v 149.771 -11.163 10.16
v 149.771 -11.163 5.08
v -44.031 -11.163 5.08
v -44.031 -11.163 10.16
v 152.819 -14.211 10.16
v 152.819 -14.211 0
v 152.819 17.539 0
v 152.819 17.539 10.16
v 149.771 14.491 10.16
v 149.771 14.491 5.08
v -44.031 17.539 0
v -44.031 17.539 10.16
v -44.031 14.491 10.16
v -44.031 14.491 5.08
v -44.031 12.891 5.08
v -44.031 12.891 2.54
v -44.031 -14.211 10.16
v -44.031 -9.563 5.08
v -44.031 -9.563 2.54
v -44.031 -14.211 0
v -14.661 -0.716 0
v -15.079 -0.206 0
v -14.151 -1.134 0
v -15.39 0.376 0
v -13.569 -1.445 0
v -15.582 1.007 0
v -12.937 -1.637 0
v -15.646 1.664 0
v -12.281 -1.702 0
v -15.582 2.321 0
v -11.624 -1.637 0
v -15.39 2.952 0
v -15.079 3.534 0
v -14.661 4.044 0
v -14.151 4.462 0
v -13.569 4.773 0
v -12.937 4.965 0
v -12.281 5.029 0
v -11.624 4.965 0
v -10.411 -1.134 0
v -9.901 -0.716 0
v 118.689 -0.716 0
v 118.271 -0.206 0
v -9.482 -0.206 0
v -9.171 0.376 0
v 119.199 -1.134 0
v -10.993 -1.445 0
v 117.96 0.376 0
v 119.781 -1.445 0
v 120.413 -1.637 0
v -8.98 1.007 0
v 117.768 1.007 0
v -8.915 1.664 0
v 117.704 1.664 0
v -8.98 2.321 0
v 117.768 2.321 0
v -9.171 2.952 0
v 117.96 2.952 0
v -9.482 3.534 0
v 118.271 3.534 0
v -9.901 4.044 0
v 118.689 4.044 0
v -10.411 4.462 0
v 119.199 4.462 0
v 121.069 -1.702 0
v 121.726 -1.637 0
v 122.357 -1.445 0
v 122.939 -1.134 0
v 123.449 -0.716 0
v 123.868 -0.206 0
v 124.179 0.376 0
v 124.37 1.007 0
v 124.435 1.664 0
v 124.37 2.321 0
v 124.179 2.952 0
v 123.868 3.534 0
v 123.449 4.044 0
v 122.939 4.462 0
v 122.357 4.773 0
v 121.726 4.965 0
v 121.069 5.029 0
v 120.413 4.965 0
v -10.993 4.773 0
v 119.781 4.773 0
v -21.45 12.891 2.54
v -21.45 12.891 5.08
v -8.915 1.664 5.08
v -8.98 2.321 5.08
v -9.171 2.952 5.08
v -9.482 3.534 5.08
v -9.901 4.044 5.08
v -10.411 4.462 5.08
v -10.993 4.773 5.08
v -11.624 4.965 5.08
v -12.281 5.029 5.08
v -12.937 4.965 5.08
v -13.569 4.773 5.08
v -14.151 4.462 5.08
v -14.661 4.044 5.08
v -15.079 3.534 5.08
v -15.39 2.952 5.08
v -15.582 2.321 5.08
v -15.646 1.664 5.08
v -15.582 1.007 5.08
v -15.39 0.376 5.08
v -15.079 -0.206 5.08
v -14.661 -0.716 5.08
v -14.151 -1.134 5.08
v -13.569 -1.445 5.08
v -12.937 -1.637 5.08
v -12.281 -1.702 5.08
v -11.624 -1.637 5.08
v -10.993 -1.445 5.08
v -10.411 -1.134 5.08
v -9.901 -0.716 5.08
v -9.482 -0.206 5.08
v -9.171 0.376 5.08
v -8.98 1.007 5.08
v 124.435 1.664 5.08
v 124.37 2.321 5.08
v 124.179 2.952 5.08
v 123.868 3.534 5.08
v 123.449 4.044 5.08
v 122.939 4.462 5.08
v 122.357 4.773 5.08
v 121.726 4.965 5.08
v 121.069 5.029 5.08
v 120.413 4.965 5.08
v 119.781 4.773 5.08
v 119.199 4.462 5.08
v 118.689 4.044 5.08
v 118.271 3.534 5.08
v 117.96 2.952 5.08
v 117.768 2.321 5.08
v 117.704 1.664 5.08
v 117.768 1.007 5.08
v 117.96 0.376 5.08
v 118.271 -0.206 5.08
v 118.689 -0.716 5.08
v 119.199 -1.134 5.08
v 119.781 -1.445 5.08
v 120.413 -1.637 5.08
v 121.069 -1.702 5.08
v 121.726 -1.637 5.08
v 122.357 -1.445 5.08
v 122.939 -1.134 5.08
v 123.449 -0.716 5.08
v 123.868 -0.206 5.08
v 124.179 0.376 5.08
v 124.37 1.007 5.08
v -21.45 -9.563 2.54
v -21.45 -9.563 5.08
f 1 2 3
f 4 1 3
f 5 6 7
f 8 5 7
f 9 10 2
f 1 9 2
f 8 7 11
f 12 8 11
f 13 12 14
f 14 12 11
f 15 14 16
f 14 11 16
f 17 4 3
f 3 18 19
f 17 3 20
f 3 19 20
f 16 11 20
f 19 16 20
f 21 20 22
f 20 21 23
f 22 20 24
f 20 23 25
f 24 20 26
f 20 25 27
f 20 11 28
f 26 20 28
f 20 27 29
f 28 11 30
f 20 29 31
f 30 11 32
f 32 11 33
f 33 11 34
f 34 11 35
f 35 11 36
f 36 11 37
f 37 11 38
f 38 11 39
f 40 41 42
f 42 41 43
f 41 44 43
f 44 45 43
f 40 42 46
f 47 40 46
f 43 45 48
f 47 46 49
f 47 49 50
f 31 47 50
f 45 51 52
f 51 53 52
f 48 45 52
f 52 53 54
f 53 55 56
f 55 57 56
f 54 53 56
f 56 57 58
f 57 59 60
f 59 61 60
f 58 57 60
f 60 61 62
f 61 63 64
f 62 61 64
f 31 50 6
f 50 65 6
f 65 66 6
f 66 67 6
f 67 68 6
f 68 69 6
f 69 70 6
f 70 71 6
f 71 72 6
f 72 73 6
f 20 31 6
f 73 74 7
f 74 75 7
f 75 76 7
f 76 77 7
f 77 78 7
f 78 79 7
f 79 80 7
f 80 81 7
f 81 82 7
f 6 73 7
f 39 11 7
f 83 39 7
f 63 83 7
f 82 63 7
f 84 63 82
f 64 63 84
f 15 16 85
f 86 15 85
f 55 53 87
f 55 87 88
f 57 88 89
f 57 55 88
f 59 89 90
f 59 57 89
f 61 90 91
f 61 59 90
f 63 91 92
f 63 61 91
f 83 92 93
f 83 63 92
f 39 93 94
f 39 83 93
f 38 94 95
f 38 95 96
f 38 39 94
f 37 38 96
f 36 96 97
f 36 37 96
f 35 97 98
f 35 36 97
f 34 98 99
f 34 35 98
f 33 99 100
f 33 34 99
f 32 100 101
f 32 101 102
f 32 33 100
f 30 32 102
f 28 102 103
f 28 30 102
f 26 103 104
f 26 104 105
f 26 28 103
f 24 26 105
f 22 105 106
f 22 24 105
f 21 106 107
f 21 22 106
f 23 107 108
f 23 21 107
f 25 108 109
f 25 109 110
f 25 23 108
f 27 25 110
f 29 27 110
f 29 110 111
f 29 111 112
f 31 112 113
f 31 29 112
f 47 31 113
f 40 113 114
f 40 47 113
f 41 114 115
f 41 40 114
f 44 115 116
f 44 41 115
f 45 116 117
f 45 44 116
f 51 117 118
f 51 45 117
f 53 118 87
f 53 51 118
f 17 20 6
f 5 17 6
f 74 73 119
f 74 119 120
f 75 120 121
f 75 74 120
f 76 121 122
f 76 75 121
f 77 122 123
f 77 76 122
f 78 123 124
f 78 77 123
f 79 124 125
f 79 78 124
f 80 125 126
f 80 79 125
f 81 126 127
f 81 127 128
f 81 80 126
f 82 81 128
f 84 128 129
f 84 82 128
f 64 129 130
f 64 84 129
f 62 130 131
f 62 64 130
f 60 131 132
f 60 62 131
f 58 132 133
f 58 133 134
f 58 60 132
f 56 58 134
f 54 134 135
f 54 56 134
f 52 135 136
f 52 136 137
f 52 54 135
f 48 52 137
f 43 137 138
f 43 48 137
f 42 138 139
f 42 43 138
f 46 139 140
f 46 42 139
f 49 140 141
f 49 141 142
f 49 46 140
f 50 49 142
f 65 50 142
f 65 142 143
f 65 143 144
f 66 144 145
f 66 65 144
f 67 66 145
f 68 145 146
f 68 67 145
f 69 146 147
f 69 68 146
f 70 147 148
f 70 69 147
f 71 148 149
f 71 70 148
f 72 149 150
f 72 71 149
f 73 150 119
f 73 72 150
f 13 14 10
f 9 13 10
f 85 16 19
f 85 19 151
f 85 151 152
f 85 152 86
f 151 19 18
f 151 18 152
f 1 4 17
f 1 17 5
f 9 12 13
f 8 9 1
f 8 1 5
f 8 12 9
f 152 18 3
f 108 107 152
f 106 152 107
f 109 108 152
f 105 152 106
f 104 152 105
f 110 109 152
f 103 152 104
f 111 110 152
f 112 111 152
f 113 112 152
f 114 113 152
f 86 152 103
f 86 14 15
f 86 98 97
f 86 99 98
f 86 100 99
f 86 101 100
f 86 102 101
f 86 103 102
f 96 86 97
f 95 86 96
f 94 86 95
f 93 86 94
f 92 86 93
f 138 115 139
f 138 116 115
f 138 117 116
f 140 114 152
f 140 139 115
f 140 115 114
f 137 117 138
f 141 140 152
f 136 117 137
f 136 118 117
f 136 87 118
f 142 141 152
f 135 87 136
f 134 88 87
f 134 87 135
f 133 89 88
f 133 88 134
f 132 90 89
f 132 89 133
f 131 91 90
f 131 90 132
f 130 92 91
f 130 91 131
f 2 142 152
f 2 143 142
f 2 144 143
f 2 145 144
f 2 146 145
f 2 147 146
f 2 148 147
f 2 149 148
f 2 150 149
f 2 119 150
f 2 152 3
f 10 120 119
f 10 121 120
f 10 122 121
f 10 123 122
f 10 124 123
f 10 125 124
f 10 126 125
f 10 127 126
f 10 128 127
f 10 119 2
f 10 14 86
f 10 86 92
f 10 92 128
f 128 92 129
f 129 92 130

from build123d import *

# Parameters (mm, degrees)
F1_DEPTH = 10.16
F0_R     = 3.3655
F0_W     = 22.5806
F0_H     = 22.4536
F2_DEPTH = 5.08
F3_START = 2.54
F3_DEPTH = 2.54


with BuildPart() as f1:
    # F0 (on Top) → F1 (new body)
    with BuildSketch(Plane.XY):
        Polygon((-44.0307967365, -11.1630027373), (-44.0307967365, -14.2110027373), (152.8192032635, -14.2110027373), (152.8192032635, 17.5389972627), (-44.0307967365, 17.5389972627), (-44.0307967365, 14.4909972627), (149.7712032635, 14.4909972627), (149.7712032635, -11.1630027373), align=None)
    extrude(amount=F1_DEPTH)

    # F0 (on Top) → F2 (join)
    with BuildSketch(Plane.XY):
        Polygon((-44.0307967365, -9.5628027373), (-44.0307967365, -11.1630027373), (149.7712032635, -11.1630027373), (149.7712032635, 14.4909972627), (-44.0307967365, 14.4909972627), (-44.0307967365, 12.8907972627), (-21.4501967365, 12.8907972627), (-21.4501967365, -9.5628027373), align=None)
        with Locations((-12.2807967365, 1.6639972627)):
            Circle(F0_R, mode=Mode.SUBTRACT)
        with Locations((121.0692032635, 1.6639972627)):
            Circle(F0_R, mode=Mode.SUBTRACT)
        with Locations((-32.7404967365, 1.6639972627)):
            Rectangle(F0_W, F0_H)
    extrude(amount=F2_DEPTH)

    # F0 (on Top) → F3 (cut)
    with BuildSketch(Plane.XY.offset(F3_START)):
        with Locations((-32.7404967365, 1.6639972627)):
            Rectangle(F0_W, F0_H)
    extrude(amount=F3_DEPTH, mode=Mode.SUBTRACT)


solid = f1.part
